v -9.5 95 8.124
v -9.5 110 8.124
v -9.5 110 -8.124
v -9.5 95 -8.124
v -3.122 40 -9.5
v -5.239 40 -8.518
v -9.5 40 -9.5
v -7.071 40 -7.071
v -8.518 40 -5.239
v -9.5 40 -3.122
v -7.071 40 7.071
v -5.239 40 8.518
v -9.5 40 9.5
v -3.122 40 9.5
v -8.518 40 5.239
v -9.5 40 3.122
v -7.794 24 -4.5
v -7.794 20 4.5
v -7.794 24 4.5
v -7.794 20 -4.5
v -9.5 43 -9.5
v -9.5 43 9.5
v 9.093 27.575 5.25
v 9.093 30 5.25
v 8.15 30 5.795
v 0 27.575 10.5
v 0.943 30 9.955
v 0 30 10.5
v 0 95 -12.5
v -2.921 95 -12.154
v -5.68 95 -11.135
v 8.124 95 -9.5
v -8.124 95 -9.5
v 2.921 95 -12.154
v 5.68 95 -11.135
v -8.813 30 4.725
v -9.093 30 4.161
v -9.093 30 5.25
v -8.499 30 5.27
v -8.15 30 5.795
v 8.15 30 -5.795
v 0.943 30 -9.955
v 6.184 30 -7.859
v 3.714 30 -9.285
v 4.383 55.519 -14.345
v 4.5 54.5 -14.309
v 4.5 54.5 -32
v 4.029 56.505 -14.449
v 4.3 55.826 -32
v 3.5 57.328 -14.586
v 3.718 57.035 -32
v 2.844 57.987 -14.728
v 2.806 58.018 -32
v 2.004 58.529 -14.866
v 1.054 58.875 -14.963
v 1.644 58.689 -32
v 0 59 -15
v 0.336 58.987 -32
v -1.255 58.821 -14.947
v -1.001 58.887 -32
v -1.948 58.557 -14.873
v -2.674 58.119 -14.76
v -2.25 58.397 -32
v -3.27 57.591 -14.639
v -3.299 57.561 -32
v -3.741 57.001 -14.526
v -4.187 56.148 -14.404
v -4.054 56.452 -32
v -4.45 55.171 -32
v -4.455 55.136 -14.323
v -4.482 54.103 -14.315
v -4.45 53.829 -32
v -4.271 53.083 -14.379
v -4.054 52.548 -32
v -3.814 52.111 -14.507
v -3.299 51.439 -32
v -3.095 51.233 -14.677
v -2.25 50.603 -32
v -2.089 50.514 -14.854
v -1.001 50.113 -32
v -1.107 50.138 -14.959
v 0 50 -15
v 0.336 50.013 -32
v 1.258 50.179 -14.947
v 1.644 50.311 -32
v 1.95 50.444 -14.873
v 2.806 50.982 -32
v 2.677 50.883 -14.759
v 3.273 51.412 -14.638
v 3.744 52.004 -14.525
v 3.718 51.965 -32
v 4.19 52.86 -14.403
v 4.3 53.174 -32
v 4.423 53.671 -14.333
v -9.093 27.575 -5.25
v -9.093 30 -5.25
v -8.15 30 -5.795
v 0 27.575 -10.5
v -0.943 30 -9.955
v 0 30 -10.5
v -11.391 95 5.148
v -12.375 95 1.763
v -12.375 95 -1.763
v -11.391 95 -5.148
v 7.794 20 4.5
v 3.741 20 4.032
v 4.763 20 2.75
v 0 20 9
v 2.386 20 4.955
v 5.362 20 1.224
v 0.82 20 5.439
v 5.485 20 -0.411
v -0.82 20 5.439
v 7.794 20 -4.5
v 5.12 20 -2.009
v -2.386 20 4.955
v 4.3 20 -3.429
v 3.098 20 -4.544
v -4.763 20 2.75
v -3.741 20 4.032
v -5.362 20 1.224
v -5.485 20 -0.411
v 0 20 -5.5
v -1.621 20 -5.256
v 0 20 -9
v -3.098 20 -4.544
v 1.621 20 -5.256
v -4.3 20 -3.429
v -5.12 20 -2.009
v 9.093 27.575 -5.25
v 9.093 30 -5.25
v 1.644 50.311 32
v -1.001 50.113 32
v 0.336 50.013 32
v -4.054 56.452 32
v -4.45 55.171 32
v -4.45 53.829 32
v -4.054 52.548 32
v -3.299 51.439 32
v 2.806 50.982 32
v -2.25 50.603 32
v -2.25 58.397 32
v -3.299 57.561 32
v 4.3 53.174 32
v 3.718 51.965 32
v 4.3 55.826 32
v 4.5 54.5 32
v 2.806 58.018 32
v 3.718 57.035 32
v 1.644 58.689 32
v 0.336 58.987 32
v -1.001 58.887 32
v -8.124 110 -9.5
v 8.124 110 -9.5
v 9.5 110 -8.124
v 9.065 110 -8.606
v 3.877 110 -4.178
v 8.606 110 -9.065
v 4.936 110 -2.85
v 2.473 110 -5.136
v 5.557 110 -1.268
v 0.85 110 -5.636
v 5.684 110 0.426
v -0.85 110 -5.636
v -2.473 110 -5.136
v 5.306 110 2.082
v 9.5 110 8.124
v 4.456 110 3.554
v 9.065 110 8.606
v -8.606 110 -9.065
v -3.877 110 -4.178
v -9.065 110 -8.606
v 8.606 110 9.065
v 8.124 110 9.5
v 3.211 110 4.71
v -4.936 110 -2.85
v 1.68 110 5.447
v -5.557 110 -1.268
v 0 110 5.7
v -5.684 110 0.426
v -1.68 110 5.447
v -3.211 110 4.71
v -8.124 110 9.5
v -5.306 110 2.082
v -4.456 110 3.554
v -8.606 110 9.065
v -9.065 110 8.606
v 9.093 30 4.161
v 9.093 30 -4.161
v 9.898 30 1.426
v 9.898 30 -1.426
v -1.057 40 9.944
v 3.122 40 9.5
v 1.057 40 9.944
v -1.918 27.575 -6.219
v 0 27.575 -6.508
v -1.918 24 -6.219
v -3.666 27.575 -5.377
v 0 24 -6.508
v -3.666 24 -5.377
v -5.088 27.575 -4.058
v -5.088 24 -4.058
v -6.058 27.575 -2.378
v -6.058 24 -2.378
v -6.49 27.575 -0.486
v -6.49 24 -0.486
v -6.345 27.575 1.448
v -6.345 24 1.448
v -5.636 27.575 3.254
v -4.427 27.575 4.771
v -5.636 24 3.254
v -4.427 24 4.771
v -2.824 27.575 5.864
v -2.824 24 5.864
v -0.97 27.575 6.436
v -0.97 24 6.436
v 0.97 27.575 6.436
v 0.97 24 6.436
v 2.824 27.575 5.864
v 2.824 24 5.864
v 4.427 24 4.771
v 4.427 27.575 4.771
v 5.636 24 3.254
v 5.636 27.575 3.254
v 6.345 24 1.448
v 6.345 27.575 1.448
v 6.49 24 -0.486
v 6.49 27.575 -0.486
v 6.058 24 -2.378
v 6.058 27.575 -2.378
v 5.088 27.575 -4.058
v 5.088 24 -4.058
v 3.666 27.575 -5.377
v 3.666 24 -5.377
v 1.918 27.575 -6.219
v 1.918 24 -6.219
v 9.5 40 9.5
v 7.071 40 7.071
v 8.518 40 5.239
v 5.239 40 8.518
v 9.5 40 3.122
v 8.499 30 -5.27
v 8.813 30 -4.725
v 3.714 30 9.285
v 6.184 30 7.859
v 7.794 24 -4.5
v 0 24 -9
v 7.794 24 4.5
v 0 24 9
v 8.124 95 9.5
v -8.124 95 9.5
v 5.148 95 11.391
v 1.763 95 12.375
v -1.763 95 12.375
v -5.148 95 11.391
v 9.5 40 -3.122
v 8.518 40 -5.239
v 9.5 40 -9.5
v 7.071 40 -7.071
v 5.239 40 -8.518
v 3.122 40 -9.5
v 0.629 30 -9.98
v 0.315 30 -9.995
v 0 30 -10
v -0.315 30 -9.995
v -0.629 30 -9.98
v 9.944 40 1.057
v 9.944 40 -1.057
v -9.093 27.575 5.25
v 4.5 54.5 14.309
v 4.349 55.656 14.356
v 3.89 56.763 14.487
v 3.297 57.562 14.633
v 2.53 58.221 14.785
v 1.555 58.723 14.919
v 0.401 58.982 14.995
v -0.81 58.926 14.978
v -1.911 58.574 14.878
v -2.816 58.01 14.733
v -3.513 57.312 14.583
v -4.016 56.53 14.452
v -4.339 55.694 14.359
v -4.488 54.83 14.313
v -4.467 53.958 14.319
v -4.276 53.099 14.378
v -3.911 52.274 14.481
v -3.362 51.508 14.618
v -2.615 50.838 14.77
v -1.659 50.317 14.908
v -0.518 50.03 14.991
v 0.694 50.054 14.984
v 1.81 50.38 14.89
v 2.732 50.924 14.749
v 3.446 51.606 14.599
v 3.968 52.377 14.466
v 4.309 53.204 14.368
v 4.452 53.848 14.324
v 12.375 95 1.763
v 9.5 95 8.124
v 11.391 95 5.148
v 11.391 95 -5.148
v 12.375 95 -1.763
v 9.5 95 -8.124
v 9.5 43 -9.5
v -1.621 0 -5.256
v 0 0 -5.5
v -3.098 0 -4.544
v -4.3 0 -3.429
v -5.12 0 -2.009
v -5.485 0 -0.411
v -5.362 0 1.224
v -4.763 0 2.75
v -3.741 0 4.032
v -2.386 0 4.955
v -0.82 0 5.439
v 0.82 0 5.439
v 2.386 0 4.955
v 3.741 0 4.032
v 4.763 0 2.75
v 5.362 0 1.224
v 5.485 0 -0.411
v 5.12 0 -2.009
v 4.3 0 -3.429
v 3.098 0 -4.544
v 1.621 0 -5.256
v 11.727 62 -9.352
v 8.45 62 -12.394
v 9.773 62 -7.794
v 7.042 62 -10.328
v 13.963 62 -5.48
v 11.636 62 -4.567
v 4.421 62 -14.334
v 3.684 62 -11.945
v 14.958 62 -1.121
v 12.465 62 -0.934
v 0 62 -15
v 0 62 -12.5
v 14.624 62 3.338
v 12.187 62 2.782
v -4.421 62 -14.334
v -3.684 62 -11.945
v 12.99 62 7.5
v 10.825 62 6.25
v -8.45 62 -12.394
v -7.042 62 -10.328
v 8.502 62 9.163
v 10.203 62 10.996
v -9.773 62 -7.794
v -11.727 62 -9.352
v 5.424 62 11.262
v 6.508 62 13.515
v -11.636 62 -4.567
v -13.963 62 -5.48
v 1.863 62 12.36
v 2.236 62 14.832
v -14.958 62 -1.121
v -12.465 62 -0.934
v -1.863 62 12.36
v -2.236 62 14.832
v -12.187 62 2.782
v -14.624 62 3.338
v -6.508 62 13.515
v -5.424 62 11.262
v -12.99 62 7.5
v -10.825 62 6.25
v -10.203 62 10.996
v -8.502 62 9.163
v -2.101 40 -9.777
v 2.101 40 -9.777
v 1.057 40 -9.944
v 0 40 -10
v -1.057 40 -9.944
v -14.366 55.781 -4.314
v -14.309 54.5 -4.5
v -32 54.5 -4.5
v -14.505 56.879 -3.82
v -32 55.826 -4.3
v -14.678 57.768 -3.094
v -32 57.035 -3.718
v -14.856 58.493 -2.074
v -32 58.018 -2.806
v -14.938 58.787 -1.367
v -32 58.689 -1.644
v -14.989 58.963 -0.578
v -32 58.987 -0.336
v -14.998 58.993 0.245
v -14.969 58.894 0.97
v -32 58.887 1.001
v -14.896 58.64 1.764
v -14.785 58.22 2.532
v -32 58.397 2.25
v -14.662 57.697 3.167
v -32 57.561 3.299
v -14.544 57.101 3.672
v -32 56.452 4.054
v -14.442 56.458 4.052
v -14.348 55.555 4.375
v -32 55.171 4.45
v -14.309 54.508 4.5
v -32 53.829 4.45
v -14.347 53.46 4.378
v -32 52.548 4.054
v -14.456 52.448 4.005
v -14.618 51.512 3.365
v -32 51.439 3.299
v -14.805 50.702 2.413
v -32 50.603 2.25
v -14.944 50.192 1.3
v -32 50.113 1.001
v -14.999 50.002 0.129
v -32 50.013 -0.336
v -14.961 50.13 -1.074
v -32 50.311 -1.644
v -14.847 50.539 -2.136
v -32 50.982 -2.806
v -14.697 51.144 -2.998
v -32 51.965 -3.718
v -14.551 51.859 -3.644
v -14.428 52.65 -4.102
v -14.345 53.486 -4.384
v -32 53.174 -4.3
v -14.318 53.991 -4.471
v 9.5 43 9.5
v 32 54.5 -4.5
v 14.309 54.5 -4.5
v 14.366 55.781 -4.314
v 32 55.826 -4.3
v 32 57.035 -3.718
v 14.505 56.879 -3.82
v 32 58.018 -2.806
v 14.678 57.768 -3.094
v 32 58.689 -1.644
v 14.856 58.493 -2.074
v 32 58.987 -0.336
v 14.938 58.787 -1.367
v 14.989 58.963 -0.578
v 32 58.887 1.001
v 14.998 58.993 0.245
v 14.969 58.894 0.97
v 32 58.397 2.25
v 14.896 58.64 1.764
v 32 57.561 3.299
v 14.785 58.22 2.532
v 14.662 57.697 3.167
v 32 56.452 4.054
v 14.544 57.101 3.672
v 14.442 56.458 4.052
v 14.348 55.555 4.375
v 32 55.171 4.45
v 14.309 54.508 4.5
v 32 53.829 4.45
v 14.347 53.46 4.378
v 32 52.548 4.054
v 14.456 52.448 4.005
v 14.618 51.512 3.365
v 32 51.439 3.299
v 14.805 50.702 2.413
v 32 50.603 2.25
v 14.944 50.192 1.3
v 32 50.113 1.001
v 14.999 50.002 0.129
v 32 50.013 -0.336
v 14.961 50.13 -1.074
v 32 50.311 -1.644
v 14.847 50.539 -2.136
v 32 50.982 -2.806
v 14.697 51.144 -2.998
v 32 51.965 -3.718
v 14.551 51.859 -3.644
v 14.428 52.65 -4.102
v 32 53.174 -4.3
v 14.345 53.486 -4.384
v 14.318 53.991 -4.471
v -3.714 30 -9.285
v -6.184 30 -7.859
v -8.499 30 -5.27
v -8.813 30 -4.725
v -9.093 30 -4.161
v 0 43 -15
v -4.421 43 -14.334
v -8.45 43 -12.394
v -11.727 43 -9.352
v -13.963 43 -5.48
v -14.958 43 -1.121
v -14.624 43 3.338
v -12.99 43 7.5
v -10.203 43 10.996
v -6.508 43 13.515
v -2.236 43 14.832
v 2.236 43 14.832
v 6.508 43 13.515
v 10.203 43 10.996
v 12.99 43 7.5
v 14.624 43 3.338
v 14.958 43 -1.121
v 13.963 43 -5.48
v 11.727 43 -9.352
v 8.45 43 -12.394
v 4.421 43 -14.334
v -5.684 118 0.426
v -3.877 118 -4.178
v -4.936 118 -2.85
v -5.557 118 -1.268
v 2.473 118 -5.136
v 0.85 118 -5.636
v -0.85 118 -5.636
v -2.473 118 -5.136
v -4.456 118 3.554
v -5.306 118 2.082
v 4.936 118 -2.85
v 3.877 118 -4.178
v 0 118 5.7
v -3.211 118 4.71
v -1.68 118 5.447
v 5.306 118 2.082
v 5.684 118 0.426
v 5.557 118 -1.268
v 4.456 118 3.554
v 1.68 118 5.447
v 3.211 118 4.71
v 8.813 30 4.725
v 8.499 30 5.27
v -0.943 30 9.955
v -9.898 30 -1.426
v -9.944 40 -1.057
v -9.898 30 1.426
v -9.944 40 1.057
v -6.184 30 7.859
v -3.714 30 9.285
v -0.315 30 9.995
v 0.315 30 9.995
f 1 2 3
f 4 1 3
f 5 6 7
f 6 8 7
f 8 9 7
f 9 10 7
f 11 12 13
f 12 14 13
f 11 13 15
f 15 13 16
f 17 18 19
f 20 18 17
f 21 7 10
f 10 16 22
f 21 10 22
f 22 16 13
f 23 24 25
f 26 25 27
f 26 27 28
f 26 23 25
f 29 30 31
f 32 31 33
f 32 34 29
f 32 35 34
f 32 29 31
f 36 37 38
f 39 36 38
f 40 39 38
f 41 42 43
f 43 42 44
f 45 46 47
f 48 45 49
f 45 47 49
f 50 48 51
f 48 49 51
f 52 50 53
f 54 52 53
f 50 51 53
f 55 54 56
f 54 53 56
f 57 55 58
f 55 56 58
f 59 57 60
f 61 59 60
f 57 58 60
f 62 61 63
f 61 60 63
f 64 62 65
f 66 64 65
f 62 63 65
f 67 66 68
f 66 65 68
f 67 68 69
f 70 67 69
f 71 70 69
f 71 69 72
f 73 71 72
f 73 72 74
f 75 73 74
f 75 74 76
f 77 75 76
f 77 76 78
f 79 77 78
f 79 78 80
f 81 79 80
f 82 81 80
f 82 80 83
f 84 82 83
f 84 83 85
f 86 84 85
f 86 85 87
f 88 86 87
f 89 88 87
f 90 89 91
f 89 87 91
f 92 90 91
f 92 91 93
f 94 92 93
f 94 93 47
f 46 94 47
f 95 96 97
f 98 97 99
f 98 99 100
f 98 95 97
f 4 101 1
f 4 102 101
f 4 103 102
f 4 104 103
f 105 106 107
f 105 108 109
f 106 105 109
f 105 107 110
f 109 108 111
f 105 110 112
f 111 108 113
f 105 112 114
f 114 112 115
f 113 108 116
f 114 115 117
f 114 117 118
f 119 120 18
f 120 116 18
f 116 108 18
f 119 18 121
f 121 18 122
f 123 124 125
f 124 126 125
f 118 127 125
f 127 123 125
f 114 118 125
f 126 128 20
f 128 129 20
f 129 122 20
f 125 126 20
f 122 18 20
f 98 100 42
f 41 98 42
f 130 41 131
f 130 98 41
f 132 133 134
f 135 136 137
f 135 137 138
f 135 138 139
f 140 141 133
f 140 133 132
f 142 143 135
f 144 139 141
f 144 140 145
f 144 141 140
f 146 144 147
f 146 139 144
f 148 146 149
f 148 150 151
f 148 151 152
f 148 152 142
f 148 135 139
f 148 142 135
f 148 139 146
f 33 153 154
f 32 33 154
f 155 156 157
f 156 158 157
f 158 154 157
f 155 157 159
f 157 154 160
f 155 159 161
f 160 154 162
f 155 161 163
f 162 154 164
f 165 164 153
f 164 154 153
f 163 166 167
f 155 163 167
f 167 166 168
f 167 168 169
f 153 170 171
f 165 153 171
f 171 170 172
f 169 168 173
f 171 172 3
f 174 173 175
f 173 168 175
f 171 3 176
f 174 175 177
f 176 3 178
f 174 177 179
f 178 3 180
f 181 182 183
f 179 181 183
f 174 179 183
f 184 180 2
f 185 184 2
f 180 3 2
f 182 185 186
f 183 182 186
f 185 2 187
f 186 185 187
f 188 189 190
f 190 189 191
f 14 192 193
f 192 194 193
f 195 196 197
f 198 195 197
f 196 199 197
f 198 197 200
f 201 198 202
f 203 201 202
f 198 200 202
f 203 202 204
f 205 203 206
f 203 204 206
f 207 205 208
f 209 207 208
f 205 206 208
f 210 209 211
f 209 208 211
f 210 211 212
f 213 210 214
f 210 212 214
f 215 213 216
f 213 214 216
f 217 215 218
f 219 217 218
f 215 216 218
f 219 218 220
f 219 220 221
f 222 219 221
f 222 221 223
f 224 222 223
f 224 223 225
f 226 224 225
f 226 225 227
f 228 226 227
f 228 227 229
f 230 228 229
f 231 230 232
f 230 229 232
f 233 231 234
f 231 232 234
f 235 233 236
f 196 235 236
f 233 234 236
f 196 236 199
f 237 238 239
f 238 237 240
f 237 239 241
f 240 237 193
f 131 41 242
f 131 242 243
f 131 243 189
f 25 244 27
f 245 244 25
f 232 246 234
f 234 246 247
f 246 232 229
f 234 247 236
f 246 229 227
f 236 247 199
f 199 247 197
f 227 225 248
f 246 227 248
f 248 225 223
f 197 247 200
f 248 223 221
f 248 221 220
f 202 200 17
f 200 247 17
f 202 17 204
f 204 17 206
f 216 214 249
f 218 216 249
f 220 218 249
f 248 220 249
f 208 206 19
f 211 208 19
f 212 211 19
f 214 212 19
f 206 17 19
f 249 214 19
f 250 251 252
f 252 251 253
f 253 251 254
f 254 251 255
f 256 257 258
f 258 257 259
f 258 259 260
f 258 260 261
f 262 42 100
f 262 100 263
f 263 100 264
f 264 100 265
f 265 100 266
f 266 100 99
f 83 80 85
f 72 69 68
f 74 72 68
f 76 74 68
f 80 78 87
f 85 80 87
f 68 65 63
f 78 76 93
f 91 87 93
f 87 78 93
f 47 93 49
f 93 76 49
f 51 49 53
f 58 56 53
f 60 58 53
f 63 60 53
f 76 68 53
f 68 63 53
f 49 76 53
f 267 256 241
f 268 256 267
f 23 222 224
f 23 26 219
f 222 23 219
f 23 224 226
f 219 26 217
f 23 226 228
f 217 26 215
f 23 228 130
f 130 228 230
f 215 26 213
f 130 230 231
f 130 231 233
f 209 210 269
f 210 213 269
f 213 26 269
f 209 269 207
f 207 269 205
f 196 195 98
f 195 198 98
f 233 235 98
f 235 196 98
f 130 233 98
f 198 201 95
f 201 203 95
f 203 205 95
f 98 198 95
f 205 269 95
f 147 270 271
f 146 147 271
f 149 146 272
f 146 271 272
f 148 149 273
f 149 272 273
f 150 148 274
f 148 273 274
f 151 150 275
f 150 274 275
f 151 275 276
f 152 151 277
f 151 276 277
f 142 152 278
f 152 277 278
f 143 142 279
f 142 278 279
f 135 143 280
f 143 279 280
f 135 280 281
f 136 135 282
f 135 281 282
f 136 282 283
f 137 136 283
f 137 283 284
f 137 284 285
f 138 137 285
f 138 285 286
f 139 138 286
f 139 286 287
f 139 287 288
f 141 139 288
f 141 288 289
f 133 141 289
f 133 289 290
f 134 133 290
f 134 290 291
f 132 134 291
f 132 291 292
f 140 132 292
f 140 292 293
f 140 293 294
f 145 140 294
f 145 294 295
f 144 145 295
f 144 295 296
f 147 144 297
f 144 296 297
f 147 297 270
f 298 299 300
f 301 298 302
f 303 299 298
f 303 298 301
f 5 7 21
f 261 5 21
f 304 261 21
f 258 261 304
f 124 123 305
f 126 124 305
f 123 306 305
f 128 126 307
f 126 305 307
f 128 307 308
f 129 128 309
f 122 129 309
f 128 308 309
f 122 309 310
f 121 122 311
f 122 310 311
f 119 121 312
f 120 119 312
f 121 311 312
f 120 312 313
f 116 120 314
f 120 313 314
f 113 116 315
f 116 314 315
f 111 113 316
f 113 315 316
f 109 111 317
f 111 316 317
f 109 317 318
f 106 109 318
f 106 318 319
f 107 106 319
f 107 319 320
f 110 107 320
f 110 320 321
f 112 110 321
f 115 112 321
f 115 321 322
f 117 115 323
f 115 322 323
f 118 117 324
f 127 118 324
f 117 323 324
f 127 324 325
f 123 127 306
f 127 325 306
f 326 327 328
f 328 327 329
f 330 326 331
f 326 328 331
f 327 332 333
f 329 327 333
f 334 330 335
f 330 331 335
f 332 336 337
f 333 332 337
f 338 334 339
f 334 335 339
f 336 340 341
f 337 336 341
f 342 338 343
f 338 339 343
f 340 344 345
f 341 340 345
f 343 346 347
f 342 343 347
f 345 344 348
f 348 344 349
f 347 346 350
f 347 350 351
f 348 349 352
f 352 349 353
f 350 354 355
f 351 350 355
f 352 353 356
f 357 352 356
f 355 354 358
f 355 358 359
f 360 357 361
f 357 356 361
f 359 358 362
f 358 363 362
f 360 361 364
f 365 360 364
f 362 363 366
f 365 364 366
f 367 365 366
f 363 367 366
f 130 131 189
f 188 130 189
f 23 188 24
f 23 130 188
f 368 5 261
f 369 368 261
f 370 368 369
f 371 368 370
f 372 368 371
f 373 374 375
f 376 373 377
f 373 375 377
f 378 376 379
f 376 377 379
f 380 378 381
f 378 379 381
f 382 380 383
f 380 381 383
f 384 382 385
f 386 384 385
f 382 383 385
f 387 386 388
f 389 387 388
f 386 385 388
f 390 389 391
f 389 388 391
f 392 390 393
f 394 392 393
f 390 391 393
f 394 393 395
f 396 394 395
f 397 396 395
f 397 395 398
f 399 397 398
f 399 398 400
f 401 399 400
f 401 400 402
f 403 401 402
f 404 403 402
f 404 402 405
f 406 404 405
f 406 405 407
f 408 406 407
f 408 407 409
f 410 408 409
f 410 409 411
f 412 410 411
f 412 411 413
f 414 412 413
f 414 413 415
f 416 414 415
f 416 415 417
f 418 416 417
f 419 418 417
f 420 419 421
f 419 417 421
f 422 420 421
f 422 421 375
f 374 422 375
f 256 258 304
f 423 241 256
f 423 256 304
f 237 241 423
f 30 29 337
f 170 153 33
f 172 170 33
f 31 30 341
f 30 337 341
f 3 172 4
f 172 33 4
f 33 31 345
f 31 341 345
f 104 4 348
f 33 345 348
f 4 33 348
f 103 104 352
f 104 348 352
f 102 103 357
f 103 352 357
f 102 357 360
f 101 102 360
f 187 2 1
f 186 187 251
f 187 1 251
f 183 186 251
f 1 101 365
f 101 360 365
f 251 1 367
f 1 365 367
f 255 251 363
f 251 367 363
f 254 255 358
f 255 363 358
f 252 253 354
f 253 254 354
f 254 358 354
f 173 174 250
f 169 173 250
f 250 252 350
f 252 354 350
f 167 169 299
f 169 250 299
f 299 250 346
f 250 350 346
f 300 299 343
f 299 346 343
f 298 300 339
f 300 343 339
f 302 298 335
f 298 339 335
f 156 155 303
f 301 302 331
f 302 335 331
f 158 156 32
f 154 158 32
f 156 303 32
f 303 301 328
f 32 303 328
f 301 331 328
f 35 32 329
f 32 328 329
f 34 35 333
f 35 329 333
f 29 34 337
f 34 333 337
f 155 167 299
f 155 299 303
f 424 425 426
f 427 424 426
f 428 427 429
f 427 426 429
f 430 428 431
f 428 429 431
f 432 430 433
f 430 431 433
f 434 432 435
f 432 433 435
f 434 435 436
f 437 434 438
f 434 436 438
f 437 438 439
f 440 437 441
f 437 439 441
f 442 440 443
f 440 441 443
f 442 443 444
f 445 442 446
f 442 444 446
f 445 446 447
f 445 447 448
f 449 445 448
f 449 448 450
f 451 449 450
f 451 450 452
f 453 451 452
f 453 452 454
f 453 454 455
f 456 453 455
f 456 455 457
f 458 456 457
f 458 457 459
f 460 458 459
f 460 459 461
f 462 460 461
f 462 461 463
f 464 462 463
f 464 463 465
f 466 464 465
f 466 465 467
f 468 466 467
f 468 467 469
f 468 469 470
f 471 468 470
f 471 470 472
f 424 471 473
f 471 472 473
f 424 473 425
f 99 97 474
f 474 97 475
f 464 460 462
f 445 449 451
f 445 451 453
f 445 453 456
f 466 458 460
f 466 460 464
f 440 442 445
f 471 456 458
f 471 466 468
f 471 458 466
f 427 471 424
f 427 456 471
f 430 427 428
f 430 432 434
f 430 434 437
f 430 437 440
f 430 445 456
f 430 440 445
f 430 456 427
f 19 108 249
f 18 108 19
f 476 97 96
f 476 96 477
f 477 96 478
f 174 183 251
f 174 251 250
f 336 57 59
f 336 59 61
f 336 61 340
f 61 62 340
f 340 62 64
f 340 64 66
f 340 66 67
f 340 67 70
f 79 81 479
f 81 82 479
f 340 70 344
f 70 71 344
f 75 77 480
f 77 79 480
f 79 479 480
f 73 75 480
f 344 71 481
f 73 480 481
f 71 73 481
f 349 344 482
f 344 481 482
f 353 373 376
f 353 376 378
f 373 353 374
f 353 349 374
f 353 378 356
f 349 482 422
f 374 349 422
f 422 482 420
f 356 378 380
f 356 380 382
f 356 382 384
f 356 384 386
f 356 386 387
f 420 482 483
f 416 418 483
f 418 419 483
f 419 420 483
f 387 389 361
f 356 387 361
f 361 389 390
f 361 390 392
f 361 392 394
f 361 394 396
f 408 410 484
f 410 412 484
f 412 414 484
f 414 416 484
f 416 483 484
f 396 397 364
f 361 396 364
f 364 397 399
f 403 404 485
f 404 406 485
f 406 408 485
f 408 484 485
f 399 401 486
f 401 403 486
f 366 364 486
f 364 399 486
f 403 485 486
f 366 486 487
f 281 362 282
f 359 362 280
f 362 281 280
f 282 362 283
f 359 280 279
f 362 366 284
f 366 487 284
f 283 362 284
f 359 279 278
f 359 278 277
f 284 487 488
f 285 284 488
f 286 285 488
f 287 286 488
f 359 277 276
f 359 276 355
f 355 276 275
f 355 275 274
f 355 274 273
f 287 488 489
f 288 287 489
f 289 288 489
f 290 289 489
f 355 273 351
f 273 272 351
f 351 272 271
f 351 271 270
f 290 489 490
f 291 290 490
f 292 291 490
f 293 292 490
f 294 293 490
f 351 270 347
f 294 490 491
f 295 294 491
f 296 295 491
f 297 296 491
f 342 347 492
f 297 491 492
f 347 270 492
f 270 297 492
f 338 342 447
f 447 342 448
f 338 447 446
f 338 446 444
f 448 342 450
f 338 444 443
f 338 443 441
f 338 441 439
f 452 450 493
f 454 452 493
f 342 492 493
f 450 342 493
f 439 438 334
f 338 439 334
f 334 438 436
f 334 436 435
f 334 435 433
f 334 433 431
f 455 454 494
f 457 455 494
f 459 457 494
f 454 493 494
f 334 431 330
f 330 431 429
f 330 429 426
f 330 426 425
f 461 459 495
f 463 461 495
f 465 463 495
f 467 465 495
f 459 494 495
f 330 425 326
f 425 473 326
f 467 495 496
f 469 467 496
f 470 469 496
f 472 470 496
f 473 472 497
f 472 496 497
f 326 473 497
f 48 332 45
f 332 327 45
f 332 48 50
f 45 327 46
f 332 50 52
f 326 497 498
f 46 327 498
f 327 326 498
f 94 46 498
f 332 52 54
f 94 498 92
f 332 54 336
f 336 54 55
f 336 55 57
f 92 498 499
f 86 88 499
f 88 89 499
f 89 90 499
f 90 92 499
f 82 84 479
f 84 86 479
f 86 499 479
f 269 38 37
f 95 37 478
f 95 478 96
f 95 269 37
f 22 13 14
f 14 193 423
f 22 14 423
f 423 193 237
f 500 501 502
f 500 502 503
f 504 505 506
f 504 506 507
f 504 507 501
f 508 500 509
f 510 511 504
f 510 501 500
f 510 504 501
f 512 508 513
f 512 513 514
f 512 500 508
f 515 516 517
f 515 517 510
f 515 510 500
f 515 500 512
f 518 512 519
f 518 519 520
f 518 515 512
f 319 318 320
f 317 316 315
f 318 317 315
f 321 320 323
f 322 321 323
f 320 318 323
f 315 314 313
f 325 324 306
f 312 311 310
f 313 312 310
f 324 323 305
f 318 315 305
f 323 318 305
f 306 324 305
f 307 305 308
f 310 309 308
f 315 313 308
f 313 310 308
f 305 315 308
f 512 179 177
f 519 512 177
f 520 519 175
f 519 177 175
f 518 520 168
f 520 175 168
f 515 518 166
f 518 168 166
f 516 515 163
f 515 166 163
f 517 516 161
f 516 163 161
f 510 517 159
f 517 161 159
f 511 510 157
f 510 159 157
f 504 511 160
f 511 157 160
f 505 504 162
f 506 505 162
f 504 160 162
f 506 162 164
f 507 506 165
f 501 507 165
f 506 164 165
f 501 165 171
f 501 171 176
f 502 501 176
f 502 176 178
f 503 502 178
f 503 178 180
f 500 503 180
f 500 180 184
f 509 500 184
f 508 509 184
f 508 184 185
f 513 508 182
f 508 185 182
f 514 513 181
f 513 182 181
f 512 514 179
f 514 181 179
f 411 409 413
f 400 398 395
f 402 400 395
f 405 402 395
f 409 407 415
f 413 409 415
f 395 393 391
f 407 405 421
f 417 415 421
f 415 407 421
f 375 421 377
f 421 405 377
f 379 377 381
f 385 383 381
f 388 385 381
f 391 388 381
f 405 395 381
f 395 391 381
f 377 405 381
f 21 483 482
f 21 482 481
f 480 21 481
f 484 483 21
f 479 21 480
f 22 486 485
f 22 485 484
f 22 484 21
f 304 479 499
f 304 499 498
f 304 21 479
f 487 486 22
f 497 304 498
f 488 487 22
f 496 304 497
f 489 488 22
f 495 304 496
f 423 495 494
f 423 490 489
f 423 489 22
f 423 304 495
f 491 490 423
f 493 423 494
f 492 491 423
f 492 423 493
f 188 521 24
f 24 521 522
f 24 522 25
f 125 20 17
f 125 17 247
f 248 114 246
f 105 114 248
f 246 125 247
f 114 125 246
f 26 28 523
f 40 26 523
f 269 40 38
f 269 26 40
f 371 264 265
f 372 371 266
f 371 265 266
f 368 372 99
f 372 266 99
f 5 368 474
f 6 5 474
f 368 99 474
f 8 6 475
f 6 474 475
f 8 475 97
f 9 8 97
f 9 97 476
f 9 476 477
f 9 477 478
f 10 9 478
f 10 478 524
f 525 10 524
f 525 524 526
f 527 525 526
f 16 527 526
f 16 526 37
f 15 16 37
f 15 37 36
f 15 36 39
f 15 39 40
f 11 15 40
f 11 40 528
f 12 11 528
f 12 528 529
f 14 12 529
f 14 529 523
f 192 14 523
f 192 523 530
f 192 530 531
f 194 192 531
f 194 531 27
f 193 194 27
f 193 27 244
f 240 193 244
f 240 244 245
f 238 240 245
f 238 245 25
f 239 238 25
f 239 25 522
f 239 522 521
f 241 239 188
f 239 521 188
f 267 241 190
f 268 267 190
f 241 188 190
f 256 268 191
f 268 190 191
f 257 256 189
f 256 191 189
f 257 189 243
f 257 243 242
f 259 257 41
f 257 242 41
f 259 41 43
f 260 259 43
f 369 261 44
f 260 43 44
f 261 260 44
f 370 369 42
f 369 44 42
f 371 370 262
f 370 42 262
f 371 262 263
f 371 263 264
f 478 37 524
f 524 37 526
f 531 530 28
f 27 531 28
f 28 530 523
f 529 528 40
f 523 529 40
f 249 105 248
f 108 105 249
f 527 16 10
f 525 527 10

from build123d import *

# Parameters (mm, degrees)
SKETCH_3_R           = 14.347327659
SKETCH_3_W           = 19
SKETCH_3_H           = 19
CUT_EXTRUDE_1_DEPTH  = 15
SKETCH_4_R           = 9.80838312
CUT_EXTRUDE_2_DEPTH  = 4
SKETCH_5_R           = 11.664818178
CUT_EXTRUDE_3_DEPTH  = 2.424756107
SKETCH_6_R           = 18.248215306
SKETCH_6_W           = 19
SKETCH_6_H           = 19
CUT_EXTRUDE_4_DEPTH  = 3
EXTRUDE_1_DEPTH      = 17
EXTRUDE_1_DEPTH_BACK = 47
SKETCH_8_R           = 4.5
SKETCH_9_R           = 5.7
EXTRUDE_2_DEPTH      = 8
EXTRUDE_3_DEPTH      = 32
EXTRUDE_3_DEPTH_BACK = 32
SKETCH_10_R          = 4.5


with BuildPart() as part:
    # Эскиз2 → Повернуть1 (revolve)
    with BuildSketch(Plane.XY, mode=Mode.PRIVATE) as revolve_1_sk:
        Polygon((0, 110), (12.5, 110), (12.5, 62), (15, 62), (15, 40), (10, 40), (10, 30), (10.5, 30), (10.5, 27.575243893), (6.508274003, 27.575243893), (6.508274003, 24), (9, 24), (9, 20), (5.5, 20), (5.5, 0), (0, 0), align=None)
    revolve(revolve_1_sk.sketch.rotate(Axis((0, 0, 0), (0, 1, 0)), 90), axis=Axis((0, 0, 0), (0, 1, 0)))

    # Эскиз3 → Вырез-Вытянуть1 (cut)
    with BuildSketch(Plane(origin=(0, 110, 0), x_dir=(1, 0, 0), z_dir=(0, 1, 0))):
        Circle(SKETCH_3_R)
        Rectangle(SKETCH_3_W, SKETCH_3_H, mode=Mode.SUBTRACT)
    extrude(amount=-CUT_EXTRUDE_1_DEPTH, mode=Mode.SUBTRACT)

    # Эскиз4 → Вырез-Вытянуть2 (cut)
    with BuildSketch(Plane.XZ.offset(-20)):
        Circle(SKETCH_4_R)
        Polygon((0, 9), (-7.794228634, 4.5), (-7.794228634, -4.5), (0, -9), (7.794228634, -4.5), (7.794228634, 4.5), align=None, mode=Mode.SUBTRACT)
    extrude(amount=-CUT_EXTRUDE_2_DEPTH, mode=Mode.SUBTRACT)

    # Эскиз5 → Вырез-Вытянуть3 (cut)
    with BuildSketch(Plane.XZ.offset(-27.575243893)):
        Circle(SKETCH_5_R)
        Polygon((0, 10.5), (-9.09326674, 5.25), (-9.09326674, -5.25), (0, -10.5), (9.09326674, -5.25), (9.09326674, 5.25), align=None, mode=Mode.SUBTRACT)
    extrude(amount=-CUT_EXTRUDE_3_DEPTH, mode=Mode.SUBTRACT)

    # Эскиз6 → Вырез-Вытянуть4 (cut)
    with BuildSketch(Plane.XZ.offset(-40)):
        Circle(SKETCH_6_R)
        Rectangle(SKETCH_6_W, SKETCH_6_H, mode=Mode.SUBTRACT)
    extrude(amount=-CUT_EXTRUDE_4_DEPTH, mode=Mode.SUBTRACT)

    # Эскиз9 → Бобышка-Вытянуть2 (add)
    with BuildSketch(Plane(origin=(0, 110, 0), x_dir=(1, 0, 0), z_dir=(0, 1, 0))):
        with Locations(Location((0, 0, 0), (0, 0, 270))):
            Circle(SKETCH_9_R)
    extrude(amount=EXTRUDE_2_DEPTH)



with BuildPart() as body_2:
    # Эскиз8 → Бобышка-Вытянуть1 (new, two sides: drawn at the far end of the back side and taken through both)
    with BuildSketch(Plane.XY.offset(15).offset(-EXTRUDE_1_DEPTH_BACK)):
        with Locations((0, 54.5)):
            Circle(SKETCH_8_R)
    extrude(amount=EXTRUDE_1_DEPTH + EXTRUDE_1_DEPTH_BACK)


with BuildPart() as part_1:
    add(part.part)

    add(body_2.part)  # Бобышка-Вытянуть3 merges body 2
    # Эскиз10 → Бобышка-Вытянуть3 (add, two sides: drawn at the far end of the back side and taken through both)
    with BuildSketch(Plane(origin=(0, 0, 0), x_dir=(0, 0, -1), z_dir=(1, 0, 0)).offset(-EXTRUDE_3_DEPTH_BACK)):
        with Locations((0, 54.5)):
            Circle(SKETCH_10_R)
    extrude(amount=EXTRUDE_3_DEPTH + EXTRUDE_3_DEPTH_BACK)


solid = part_1.part
